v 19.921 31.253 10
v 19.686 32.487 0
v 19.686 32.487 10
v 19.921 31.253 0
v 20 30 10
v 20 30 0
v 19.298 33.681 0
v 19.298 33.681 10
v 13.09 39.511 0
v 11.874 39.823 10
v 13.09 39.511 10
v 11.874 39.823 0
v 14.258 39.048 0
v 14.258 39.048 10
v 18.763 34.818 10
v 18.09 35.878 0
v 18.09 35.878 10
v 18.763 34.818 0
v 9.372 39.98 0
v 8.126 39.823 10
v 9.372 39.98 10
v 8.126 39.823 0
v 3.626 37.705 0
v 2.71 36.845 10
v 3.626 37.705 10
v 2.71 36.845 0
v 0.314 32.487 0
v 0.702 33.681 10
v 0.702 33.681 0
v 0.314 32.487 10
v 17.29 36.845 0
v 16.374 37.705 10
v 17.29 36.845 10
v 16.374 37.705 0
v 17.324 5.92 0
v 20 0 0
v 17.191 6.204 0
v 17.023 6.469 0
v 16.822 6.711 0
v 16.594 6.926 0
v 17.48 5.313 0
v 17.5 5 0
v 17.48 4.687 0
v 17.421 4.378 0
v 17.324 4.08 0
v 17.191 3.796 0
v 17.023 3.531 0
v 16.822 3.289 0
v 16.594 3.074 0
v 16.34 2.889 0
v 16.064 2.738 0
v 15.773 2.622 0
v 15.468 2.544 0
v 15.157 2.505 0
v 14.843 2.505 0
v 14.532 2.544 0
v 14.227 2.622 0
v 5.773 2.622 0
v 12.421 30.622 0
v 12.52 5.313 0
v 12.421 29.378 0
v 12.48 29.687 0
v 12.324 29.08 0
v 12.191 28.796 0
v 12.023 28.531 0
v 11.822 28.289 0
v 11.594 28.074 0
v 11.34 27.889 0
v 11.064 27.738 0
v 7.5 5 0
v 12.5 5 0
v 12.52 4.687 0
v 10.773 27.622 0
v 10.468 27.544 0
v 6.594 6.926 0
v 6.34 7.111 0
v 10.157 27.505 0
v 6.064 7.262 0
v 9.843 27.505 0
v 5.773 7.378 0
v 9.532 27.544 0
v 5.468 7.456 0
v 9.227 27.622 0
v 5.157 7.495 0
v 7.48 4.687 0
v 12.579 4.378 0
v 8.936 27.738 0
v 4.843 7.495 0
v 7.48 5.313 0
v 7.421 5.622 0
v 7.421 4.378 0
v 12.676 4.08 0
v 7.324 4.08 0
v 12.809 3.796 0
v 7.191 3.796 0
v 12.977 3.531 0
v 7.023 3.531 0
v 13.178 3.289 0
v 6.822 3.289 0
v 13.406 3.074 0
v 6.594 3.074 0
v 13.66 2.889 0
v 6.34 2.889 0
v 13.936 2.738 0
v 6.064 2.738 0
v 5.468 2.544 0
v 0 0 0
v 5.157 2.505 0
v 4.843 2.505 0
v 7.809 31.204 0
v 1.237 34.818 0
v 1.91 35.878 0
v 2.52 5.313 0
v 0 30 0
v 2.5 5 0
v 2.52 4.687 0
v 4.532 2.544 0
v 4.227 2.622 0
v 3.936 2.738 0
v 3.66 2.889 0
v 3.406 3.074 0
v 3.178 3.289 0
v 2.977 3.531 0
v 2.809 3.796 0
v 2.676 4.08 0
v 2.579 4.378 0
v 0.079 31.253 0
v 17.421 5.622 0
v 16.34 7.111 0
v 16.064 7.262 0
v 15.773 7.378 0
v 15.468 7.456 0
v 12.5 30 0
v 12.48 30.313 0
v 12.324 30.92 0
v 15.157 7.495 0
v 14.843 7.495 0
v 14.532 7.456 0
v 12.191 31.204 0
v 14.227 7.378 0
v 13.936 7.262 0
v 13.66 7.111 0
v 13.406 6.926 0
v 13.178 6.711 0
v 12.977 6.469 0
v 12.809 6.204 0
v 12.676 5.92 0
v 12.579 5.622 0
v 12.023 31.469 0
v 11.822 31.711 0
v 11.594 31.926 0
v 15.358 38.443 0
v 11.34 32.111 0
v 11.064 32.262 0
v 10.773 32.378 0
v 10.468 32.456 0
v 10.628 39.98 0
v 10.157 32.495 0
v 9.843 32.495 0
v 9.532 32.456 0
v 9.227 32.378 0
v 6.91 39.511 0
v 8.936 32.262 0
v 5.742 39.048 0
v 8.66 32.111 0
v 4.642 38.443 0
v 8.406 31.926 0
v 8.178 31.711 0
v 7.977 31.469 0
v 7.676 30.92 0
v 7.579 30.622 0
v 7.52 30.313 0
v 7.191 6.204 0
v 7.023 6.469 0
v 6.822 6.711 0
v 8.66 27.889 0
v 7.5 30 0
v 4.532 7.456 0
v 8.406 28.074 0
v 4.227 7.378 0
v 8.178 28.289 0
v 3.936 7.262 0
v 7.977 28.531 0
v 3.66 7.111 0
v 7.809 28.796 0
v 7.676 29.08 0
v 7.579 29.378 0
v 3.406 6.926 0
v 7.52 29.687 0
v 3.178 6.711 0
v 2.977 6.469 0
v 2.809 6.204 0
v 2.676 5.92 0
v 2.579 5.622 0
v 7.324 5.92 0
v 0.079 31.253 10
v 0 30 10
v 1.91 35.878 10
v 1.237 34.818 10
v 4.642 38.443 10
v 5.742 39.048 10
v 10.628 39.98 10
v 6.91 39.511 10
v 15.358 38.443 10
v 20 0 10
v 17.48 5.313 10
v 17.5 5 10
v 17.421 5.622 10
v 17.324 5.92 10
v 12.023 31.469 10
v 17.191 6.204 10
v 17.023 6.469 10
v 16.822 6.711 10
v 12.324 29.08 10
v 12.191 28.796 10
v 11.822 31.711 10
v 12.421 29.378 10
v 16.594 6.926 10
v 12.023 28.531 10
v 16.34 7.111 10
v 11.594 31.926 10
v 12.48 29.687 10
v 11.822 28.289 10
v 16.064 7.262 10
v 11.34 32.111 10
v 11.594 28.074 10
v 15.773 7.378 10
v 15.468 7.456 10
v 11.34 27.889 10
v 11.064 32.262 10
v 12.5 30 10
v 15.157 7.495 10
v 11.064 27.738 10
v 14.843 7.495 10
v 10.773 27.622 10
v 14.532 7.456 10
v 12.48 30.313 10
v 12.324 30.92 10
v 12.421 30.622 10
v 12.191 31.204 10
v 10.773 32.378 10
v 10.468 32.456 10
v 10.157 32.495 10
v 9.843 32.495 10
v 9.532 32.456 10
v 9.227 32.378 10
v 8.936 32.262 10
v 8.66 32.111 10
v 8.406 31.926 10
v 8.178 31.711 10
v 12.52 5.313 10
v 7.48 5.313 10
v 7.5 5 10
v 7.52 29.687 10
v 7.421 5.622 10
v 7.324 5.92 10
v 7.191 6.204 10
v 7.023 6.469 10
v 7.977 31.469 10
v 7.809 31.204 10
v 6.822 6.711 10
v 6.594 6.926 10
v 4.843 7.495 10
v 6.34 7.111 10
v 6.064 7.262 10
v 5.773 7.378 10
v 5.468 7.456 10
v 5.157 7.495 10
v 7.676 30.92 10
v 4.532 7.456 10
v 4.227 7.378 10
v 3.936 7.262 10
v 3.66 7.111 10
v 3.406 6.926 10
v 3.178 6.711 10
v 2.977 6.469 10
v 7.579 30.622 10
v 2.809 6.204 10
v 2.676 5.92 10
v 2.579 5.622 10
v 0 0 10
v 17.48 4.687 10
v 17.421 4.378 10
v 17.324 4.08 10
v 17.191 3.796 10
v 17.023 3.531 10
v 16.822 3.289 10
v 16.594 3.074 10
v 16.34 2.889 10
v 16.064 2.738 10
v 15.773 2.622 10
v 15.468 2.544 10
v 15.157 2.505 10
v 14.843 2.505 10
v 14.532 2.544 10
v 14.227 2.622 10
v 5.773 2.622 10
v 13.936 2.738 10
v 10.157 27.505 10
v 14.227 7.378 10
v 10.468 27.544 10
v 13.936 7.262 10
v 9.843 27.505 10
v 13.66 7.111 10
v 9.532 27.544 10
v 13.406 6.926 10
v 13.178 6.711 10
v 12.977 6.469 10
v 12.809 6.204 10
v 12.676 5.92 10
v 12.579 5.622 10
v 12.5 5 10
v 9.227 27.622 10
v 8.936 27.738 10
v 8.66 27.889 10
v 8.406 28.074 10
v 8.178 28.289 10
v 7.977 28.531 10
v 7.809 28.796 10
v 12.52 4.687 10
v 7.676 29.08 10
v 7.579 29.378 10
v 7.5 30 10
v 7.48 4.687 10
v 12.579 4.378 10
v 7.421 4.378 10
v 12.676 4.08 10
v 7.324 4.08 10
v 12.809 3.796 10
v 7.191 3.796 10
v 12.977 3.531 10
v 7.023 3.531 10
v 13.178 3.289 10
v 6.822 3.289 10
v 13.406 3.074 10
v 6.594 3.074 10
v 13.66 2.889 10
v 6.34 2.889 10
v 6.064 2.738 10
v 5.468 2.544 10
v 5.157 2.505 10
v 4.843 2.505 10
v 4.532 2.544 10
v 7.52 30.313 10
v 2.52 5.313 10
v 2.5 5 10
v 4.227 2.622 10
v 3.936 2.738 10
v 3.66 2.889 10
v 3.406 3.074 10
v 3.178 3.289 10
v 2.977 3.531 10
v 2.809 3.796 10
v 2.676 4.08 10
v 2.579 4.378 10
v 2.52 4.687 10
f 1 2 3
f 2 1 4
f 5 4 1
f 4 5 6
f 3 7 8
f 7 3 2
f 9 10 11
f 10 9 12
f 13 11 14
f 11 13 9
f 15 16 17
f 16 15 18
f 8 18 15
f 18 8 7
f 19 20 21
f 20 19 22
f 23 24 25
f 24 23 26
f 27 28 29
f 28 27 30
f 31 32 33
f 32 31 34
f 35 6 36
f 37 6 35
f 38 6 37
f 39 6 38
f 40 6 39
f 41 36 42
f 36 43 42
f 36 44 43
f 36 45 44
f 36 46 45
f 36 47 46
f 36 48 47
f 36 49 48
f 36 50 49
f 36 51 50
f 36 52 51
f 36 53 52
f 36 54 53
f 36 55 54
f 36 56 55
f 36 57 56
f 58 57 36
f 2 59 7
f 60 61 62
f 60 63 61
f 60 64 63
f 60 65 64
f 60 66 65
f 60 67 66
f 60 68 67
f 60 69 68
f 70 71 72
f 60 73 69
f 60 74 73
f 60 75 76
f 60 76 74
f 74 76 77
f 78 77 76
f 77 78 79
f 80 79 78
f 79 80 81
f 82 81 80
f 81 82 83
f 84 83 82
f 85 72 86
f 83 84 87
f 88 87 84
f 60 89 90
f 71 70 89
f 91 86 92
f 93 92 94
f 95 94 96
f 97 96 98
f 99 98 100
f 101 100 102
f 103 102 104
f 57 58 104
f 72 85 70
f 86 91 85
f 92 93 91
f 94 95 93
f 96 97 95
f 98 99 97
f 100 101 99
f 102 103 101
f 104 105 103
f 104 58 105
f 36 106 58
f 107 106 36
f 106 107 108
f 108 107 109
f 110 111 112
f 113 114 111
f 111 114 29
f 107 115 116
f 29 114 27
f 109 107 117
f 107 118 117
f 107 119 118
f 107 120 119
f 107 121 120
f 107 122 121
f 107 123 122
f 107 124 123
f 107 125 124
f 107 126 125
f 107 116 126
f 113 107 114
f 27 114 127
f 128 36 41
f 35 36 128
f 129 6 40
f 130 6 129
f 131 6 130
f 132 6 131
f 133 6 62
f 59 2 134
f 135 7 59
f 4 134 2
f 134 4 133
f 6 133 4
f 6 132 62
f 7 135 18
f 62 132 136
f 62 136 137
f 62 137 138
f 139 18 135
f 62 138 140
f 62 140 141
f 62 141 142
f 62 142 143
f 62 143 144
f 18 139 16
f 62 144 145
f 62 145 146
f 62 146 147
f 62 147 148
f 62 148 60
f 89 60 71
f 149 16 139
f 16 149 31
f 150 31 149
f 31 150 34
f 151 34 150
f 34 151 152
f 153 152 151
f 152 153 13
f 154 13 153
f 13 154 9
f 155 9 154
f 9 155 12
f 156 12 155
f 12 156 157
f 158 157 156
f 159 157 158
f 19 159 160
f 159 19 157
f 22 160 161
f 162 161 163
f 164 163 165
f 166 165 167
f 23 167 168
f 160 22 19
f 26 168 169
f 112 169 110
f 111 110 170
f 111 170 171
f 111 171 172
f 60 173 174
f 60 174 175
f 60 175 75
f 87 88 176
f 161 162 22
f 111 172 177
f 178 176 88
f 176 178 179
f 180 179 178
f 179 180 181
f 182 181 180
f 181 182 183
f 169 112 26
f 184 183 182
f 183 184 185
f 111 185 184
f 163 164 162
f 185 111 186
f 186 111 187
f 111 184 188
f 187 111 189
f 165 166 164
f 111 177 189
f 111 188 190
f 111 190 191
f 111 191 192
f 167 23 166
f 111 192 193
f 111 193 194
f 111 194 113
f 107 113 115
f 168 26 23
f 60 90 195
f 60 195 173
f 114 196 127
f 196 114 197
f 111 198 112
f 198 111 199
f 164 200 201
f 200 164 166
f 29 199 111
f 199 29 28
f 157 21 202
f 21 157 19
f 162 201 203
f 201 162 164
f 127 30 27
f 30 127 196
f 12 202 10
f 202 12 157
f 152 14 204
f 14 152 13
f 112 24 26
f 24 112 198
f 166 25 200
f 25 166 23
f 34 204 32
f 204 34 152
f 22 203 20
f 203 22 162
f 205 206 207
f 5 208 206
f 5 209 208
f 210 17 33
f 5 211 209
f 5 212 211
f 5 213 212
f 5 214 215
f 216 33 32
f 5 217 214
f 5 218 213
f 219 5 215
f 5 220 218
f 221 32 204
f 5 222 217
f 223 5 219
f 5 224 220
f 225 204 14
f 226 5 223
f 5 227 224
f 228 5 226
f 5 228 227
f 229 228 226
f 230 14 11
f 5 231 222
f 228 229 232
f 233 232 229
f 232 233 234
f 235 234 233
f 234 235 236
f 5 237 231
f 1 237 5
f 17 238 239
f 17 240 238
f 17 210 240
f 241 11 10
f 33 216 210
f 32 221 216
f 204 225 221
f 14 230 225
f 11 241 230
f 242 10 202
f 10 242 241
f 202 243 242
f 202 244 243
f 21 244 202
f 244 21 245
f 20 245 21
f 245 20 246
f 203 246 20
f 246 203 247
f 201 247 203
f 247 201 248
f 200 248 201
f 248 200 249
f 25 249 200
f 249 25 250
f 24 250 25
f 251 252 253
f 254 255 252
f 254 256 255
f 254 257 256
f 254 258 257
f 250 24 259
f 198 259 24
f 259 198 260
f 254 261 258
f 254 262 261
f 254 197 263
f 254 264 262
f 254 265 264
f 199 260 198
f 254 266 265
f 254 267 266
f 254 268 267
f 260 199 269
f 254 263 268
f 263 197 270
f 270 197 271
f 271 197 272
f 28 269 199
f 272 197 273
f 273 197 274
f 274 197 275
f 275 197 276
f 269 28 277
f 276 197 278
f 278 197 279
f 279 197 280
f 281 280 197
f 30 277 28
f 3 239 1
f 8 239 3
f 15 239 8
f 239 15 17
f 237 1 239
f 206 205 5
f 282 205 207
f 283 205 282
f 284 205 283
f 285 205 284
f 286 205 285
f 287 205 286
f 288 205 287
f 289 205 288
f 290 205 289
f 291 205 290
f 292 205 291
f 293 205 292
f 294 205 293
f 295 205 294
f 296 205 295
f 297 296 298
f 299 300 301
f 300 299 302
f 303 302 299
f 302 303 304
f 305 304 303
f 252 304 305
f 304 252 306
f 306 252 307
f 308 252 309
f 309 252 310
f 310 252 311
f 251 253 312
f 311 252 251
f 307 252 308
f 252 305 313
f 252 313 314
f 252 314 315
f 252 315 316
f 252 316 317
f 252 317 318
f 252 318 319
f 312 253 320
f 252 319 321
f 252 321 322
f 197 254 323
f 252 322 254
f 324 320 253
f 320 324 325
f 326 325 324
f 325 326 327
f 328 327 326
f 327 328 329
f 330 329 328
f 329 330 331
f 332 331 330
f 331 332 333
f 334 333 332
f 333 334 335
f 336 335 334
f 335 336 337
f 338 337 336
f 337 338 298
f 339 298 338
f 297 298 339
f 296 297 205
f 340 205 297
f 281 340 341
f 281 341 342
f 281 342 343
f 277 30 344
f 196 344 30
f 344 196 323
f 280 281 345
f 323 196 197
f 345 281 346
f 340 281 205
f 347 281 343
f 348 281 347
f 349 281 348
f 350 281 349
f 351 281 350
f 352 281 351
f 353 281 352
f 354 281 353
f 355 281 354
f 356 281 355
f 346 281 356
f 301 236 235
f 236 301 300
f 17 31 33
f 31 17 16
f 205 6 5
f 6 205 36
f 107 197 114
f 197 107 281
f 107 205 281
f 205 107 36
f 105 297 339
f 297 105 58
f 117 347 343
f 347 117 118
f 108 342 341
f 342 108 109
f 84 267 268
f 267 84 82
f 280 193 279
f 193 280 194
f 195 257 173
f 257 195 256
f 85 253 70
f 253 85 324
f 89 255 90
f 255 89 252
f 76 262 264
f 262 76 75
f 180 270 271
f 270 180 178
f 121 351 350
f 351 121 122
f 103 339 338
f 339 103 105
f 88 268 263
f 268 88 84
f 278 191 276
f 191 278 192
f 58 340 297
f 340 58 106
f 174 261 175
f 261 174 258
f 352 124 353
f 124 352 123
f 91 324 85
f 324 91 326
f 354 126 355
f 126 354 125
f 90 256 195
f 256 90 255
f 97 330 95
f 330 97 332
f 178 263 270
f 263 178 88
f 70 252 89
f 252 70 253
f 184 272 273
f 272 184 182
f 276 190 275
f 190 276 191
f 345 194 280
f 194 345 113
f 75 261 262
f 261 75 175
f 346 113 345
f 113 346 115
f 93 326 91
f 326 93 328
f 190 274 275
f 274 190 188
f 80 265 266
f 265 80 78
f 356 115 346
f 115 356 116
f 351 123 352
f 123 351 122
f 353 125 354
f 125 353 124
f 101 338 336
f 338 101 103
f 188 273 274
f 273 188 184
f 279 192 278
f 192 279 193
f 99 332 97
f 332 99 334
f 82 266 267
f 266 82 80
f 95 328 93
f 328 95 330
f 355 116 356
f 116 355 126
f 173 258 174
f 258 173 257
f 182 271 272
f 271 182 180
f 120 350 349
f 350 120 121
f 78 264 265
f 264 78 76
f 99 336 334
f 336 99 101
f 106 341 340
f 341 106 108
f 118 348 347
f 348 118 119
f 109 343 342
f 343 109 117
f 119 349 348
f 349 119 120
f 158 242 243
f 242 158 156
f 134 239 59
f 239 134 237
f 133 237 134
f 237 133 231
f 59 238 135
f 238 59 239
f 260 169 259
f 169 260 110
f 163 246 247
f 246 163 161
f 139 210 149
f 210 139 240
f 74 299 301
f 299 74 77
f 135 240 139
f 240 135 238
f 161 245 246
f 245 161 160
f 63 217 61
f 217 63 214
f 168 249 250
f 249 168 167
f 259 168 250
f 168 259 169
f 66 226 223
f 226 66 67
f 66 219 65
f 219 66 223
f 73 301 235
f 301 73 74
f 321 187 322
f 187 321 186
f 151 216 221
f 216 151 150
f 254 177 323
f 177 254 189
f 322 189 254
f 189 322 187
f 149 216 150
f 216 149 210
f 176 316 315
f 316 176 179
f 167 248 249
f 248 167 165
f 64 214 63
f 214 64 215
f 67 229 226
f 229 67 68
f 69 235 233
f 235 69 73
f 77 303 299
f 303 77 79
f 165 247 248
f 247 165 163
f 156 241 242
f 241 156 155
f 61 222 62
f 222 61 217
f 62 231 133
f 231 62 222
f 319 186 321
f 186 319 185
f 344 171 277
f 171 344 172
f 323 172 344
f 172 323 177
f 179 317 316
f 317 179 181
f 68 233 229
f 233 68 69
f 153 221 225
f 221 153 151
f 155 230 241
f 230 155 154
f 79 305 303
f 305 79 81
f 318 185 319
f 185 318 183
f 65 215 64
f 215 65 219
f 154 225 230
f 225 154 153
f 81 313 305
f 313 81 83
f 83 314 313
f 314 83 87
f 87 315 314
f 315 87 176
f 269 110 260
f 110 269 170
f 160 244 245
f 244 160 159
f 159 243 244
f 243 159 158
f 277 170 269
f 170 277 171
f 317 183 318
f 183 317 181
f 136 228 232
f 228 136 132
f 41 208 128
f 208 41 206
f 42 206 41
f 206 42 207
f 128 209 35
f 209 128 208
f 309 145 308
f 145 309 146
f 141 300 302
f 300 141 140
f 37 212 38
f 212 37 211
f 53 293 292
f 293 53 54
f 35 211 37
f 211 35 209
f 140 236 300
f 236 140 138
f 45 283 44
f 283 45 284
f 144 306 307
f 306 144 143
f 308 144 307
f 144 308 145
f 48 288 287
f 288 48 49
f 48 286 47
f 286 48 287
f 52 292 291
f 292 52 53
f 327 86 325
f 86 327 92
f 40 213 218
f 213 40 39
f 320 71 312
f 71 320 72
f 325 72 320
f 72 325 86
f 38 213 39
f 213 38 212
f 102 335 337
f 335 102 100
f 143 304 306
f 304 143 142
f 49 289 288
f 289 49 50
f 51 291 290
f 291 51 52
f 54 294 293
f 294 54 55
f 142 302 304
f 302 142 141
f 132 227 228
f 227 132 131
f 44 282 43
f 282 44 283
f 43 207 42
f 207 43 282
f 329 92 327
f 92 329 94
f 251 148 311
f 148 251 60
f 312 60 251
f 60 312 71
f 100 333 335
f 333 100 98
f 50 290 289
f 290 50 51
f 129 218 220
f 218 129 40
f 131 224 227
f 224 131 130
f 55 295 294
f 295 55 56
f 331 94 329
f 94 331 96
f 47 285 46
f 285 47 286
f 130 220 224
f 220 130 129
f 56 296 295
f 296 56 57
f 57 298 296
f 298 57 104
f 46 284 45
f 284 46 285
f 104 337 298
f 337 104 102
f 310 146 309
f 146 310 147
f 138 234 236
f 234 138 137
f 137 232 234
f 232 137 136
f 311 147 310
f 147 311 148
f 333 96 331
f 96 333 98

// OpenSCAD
// file: round-hole.scad
// Round Hole

// Defaults

gRes = 50;
gNudge = 0.01;

module RoundHole(
	PosX,	        // drill position x
	PosY,	        // drill position y
	Dia,		        // drill diameter
	Depth,	        // drill depth
	Res = gRes,		// render resolution
	Nudge = gNudge)	// render error compensation
	{
	translate([PosX,PosY,-Nudge]) 
	cylinder(h = Nudge + Depth + Nudge, d = Dia, $fn = Res);
	}

// Demo

RoundHole(10,15,5,10);
// file: round-key.scad
// Round Key

// Defaults

gRes = 50;
gNudge = 0.01;

module RoundKey(
	Dia,            // key diameter
	Slice,          // key slice removed
	Thick,          // key thickness
    Res = gRes,     // render resolution
	Nudge = gNudge) // render error compensation
	{
	difference()
		{
		color("green")
		cylinder(d = Dia, h = Thick, $fn = Res);
		color("red")
		translate([-Dia/2-Nudge,-1.5*Dia-2*Nudge+Slice,-Nudge])
		cube([Dia+2*Nudge,Dia+2*Nudge,Thick+2*Nudge]);
		}
	}

// Demo

RoundKey(30,20,10);//
// file: round-holes.scad
// Round Holes

use <round-hole.scad>;

// Defaults

gRes = 50;
gNudge = 0.01;

module RoundHoles(
	DrillSched,		// drill schedule list, [[PosX,PosY,Dia,Depth],...]
	Res = gRes,		// render resolution
	Nudge = gNudge)	// render error compensation
	{
	for(sched = DrillSched)
		{
		RoundHole(sched[0], sched[1], sched[2], sched[3], Res = gRes, Nudge = gNudge);
		}
	}

// Demo

RoundHoles([[10,10,5,10],[10,-10,5,10],[-10,10,5,10],[-10,-10,5,10]]);
// main file
// Round Bracket
// Construct a round nosed bracket.

use <round-holes.scad>;
use <round-key.scad>;

// Defaults

gRes = 50;
gNudge = 0.01;

module RoundBracket(
    Dia,            // nose diameter
    DimY,           // overall length
    DimZ,           // thickness
	DrillSched,     // drill schedule list, [[PosX,PosY,Dia,Depth],...]
    Res = gRes,     // render resolution
    Nudge = gNudge) // render error compensation
	{
	difference()
		{
		union()
			{
			color("green")
			cube([Dia, DimY-Dia/2, DimZ]);
			color("blue")
			translate([Dia/2,DimY-Dia/2,0])
			RoundKey(Dia,Dia/2,DimZ);
			}
		color("red")
		RoundHoles(DrillSched);
		}
	}

// Demo

RoundBracket(20,40,10, [[5,5,5,10],[10,30,5,10],[15,5,5,10]]);
